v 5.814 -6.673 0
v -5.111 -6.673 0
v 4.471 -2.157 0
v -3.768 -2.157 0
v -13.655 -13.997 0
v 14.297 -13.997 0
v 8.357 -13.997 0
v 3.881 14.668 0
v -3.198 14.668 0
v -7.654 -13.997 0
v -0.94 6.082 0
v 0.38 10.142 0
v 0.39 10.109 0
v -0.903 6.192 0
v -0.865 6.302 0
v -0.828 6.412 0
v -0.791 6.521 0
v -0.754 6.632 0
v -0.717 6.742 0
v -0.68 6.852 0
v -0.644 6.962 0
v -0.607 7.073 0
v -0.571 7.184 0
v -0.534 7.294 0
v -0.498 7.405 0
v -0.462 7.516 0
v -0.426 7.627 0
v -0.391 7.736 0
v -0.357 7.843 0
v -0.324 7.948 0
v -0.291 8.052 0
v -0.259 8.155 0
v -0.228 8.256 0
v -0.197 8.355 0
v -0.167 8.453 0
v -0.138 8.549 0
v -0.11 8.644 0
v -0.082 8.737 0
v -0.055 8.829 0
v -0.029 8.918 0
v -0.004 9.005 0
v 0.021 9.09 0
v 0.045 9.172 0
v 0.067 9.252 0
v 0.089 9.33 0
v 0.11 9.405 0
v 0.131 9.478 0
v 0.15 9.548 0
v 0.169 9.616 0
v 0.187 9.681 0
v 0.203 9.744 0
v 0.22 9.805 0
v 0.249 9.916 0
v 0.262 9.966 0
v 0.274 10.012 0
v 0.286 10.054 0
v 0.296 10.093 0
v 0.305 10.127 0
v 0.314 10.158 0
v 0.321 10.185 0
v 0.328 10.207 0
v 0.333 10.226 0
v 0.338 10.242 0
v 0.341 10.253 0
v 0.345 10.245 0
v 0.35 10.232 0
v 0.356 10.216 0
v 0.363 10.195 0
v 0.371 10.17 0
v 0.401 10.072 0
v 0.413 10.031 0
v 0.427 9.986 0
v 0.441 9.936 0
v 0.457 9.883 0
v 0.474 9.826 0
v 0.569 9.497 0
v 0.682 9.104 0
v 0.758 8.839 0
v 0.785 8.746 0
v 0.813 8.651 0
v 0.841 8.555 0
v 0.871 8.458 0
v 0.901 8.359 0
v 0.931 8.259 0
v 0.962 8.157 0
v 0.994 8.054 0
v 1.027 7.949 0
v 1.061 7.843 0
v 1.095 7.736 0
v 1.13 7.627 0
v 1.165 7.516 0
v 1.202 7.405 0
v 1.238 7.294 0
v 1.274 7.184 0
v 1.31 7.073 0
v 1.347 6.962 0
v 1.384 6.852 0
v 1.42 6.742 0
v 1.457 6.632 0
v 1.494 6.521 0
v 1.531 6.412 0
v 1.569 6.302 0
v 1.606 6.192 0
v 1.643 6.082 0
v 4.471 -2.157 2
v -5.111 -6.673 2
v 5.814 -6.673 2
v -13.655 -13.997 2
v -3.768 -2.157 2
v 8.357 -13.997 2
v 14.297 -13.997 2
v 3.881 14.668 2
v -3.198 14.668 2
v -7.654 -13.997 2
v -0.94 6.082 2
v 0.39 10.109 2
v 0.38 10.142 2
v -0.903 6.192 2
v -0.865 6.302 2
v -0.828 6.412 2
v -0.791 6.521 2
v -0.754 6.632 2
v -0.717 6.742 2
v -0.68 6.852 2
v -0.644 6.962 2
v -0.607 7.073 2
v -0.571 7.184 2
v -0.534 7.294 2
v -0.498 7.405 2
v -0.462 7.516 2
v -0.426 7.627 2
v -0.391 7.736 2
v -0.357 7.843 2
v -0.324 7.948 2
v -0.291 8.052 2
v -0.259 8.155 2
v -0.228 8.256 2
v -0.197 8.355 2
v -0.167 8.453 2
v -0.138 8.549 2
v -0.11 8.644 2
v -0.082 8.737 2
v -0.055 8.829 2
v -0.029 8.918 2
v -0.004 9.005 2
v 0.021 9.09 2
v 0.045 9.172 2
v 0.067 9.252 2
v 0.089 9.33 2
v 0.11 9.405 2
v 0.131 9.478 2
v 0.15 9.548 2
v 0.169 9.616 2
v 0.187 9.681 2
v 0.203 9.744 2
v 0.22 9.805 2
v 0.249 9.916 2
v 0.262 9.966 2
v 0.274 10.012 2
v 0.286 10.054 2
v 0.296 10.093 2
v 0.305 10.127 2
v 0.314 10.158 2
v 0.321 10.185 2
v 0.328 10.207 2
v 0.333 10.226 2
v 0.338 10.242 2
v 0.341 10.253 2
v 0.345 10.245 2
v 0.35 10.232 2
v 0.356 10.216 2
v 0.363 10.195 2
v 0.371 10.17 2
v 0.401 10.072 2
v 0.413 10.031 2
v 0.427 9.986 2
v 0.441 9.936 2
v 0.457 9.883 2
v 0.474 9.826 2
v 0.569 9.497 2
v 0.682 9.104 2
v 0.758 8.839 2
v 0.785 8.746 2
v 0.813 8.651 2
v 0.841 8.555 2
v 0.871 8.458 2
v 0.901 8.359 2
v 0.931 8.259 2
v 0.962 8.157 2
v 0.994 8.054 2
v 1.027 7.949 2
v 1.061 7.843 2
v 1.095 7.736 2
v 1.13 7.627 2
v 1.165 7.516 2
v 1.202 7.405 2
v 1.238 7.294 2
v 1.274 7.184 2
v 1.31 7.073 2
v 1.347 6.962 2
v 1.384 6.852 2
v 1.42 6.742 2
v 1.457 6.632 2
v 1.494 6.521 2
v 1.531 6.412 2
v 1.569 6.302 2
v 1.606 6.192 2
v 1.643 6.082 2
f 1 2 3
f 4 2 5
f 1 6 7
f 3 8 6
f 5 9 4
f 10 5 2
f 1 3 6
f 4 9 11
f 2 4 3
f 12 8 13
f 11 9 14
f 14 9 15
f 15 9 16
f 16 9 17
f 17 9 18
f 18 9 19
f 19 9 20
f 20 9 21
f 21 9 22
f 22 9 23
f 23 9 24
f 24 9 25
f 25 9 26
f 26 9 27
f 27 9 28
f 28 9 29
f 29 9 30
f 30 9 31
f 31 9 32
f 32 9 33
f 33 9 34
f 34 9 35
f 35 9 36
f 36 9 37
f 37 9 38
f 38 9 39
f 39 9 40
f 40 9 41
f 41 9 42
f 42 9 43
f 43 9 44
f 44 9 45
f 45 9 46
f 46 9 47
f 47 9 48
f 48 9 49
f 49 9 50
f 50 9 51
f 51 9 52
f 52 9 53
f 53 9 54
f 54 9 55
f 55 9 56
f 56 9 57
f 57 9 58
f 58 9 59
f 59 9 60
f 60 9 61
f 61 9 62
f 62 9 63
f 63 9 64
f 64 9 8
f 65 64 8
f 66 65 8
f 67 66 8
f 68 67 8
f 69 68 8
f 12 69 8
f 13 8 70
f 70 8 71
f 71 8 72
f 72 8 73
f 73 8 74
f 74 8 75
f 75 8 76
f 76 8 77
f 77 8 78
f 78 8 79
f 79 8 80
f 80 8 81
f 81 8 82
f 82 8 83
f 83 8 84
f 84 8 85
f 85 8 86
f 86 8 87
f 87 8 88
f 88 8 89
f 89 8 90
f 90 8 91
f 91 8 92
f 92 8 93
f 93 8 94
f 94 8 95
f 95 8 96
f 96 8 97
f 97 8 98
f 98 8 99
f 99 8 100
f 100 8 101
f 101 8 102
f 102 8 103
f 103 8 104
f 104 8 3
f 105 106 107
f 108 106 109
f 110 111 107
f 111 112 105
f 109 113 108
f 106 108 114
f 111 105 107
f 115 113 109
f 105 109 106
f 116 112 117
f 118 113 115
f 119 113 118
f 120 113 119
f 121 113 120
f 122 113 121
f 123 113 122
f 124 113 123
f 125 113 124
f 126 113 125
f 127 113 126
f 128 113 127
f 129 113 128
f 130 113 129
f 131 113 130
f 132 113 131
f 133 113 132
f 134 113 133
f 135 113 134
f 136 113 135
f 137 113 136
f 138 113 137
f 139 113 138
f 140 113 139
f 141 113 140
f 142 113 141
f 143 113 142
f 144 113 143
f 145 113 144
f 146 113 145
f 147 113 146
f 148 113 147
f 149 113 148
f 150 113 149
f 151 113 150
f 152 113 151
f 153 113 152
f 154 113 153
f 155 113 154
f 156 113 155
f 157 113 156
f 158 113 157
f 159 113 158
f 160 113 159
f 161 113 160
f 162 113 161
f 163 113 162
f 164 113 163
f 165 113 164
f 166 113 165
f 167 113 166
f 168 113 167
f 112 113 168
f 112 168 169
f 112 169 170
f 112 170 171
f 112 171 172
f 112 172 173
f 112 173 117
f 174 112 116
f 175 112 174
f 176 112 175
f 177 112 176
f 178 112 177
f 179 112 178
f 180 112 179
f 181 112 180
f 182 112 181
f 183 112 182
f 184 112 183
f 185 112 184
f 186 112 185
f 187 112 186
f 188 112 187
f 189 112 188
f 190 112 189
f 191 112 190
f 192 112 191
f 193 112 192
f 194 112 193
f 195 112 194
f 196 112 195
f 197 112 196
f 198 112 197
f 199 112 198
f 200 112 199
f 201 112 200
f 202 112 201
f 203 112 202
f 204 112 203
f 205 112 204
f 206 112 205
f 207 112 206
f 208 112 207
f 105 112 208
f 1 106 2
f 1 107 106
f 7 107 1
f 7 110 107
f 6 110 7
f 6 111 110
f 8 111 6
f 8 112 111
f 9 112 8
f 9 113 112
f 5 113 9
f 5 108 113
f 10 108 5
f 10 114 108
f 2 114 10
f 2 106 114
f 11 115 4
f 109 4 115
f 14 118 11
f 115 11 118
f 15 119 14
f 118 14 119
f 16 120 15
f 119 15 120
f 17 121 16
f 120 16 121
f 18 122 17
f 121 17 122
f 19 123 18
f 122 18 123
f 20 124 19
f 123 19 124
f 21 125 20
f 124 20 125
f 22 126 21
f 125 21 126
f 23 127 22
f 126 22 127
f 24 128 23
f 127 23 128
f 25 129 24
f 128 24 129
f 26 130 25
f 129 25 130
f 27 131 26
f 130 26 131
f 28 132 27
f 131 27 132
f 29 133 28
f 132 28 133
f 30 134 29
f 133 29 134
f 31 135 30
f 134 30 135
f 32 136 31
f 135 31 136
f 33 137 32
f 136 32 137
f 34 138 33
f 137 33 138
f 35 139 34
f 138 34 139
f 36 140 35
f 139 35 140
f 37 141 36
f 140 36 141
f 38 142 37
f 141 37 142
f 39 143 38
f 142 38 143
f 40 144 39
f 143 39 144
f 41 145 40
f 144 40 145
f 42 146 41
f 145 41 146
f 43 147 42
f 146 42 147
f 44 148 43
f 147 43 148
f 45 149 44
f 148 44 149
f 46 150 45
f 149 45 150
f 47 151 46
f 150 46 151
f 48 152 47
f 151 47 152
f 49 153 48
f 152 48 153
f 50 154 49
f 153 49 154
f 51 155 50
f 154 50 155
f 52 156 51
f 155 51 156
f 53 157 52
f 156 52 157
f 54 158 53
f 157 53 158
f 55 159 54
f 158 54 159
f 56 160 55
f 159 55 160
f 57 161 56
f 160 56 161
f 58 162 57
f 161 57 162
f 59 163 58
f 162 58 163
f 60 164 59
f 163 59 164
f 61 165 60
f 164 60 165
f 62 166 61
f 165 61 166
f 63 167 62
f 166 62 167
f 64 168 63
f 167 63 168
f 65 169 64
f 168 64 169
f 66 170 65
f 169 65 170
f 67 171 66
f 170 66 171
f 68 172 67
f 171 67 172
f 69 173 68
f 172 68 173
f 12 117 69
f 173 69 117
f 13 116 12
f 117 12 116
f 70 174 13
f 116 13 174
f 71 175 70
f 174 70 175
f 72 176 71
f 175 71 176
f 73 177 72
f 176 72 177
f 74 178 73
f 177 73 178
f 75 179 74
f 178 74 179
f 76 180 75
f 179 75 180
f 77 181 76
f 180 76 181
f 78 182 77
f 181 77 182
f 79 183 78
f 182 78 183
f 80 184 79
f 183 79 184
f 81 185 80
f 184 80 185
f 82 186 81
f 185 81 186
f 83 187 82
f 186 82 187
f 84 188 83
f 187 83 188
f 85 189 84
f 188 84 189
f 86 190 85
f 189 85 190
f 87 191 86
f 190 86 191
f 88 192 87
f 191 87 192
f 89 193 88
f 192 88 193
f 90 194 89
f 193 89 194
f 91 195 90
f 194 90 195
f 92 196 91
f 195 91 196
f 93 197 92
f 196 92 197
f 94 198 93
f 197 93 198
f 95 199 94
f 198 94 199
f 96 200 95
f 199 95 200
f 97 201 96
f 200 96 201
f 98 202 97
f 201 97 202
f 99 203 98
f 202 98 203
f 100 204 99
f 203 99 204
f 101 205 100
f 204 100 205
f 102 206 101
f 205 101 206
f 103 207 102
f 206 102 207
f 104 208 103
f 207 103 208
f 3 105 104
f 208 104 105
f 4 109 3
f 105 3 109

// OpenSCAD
// file: lib/scale_overlay.scad
module scale_overlay(length = 100, major_step = 10, tick_height = 2, tick_width = 0.8, base_height = 0.4) {
    color([0.1, 0.1, 0.1])
        cube([length, tick_width, base_height]);

    for (x = [0:major_step:length]) {
        color([0.1, 0.1, 0.1])
            translate([x, 0, 0])
                cube([tick_width, tick_width, tick_height]);
    }
}
// main file
// Small flat letter "A" — a quick test print.

include <lib/scale_overlay.scad>;

$fn = 100;

letter = "A";
size = 30;
thickness = 2;
text_font = "Liberation Sans:style=Bold";
show_scale = false;

module ay_model(
    letter = "A",
    size = 30,
    thickness = 2,
    text_font = "Liberation Sans:style=Bold"
) {
    linear_extrude(height = thickness)
        text(letter, size = size, halign = "center", valign = "center", font = text_font);
}

ay_model(
    letter = letter,
    size = size,
    thickness = thickness,
    text_font = text_font
);

if (show_scale) {
    translate([-size, -size * 0.8, 0])
        scale_overlay(length = 100, major_step = 10);
}
